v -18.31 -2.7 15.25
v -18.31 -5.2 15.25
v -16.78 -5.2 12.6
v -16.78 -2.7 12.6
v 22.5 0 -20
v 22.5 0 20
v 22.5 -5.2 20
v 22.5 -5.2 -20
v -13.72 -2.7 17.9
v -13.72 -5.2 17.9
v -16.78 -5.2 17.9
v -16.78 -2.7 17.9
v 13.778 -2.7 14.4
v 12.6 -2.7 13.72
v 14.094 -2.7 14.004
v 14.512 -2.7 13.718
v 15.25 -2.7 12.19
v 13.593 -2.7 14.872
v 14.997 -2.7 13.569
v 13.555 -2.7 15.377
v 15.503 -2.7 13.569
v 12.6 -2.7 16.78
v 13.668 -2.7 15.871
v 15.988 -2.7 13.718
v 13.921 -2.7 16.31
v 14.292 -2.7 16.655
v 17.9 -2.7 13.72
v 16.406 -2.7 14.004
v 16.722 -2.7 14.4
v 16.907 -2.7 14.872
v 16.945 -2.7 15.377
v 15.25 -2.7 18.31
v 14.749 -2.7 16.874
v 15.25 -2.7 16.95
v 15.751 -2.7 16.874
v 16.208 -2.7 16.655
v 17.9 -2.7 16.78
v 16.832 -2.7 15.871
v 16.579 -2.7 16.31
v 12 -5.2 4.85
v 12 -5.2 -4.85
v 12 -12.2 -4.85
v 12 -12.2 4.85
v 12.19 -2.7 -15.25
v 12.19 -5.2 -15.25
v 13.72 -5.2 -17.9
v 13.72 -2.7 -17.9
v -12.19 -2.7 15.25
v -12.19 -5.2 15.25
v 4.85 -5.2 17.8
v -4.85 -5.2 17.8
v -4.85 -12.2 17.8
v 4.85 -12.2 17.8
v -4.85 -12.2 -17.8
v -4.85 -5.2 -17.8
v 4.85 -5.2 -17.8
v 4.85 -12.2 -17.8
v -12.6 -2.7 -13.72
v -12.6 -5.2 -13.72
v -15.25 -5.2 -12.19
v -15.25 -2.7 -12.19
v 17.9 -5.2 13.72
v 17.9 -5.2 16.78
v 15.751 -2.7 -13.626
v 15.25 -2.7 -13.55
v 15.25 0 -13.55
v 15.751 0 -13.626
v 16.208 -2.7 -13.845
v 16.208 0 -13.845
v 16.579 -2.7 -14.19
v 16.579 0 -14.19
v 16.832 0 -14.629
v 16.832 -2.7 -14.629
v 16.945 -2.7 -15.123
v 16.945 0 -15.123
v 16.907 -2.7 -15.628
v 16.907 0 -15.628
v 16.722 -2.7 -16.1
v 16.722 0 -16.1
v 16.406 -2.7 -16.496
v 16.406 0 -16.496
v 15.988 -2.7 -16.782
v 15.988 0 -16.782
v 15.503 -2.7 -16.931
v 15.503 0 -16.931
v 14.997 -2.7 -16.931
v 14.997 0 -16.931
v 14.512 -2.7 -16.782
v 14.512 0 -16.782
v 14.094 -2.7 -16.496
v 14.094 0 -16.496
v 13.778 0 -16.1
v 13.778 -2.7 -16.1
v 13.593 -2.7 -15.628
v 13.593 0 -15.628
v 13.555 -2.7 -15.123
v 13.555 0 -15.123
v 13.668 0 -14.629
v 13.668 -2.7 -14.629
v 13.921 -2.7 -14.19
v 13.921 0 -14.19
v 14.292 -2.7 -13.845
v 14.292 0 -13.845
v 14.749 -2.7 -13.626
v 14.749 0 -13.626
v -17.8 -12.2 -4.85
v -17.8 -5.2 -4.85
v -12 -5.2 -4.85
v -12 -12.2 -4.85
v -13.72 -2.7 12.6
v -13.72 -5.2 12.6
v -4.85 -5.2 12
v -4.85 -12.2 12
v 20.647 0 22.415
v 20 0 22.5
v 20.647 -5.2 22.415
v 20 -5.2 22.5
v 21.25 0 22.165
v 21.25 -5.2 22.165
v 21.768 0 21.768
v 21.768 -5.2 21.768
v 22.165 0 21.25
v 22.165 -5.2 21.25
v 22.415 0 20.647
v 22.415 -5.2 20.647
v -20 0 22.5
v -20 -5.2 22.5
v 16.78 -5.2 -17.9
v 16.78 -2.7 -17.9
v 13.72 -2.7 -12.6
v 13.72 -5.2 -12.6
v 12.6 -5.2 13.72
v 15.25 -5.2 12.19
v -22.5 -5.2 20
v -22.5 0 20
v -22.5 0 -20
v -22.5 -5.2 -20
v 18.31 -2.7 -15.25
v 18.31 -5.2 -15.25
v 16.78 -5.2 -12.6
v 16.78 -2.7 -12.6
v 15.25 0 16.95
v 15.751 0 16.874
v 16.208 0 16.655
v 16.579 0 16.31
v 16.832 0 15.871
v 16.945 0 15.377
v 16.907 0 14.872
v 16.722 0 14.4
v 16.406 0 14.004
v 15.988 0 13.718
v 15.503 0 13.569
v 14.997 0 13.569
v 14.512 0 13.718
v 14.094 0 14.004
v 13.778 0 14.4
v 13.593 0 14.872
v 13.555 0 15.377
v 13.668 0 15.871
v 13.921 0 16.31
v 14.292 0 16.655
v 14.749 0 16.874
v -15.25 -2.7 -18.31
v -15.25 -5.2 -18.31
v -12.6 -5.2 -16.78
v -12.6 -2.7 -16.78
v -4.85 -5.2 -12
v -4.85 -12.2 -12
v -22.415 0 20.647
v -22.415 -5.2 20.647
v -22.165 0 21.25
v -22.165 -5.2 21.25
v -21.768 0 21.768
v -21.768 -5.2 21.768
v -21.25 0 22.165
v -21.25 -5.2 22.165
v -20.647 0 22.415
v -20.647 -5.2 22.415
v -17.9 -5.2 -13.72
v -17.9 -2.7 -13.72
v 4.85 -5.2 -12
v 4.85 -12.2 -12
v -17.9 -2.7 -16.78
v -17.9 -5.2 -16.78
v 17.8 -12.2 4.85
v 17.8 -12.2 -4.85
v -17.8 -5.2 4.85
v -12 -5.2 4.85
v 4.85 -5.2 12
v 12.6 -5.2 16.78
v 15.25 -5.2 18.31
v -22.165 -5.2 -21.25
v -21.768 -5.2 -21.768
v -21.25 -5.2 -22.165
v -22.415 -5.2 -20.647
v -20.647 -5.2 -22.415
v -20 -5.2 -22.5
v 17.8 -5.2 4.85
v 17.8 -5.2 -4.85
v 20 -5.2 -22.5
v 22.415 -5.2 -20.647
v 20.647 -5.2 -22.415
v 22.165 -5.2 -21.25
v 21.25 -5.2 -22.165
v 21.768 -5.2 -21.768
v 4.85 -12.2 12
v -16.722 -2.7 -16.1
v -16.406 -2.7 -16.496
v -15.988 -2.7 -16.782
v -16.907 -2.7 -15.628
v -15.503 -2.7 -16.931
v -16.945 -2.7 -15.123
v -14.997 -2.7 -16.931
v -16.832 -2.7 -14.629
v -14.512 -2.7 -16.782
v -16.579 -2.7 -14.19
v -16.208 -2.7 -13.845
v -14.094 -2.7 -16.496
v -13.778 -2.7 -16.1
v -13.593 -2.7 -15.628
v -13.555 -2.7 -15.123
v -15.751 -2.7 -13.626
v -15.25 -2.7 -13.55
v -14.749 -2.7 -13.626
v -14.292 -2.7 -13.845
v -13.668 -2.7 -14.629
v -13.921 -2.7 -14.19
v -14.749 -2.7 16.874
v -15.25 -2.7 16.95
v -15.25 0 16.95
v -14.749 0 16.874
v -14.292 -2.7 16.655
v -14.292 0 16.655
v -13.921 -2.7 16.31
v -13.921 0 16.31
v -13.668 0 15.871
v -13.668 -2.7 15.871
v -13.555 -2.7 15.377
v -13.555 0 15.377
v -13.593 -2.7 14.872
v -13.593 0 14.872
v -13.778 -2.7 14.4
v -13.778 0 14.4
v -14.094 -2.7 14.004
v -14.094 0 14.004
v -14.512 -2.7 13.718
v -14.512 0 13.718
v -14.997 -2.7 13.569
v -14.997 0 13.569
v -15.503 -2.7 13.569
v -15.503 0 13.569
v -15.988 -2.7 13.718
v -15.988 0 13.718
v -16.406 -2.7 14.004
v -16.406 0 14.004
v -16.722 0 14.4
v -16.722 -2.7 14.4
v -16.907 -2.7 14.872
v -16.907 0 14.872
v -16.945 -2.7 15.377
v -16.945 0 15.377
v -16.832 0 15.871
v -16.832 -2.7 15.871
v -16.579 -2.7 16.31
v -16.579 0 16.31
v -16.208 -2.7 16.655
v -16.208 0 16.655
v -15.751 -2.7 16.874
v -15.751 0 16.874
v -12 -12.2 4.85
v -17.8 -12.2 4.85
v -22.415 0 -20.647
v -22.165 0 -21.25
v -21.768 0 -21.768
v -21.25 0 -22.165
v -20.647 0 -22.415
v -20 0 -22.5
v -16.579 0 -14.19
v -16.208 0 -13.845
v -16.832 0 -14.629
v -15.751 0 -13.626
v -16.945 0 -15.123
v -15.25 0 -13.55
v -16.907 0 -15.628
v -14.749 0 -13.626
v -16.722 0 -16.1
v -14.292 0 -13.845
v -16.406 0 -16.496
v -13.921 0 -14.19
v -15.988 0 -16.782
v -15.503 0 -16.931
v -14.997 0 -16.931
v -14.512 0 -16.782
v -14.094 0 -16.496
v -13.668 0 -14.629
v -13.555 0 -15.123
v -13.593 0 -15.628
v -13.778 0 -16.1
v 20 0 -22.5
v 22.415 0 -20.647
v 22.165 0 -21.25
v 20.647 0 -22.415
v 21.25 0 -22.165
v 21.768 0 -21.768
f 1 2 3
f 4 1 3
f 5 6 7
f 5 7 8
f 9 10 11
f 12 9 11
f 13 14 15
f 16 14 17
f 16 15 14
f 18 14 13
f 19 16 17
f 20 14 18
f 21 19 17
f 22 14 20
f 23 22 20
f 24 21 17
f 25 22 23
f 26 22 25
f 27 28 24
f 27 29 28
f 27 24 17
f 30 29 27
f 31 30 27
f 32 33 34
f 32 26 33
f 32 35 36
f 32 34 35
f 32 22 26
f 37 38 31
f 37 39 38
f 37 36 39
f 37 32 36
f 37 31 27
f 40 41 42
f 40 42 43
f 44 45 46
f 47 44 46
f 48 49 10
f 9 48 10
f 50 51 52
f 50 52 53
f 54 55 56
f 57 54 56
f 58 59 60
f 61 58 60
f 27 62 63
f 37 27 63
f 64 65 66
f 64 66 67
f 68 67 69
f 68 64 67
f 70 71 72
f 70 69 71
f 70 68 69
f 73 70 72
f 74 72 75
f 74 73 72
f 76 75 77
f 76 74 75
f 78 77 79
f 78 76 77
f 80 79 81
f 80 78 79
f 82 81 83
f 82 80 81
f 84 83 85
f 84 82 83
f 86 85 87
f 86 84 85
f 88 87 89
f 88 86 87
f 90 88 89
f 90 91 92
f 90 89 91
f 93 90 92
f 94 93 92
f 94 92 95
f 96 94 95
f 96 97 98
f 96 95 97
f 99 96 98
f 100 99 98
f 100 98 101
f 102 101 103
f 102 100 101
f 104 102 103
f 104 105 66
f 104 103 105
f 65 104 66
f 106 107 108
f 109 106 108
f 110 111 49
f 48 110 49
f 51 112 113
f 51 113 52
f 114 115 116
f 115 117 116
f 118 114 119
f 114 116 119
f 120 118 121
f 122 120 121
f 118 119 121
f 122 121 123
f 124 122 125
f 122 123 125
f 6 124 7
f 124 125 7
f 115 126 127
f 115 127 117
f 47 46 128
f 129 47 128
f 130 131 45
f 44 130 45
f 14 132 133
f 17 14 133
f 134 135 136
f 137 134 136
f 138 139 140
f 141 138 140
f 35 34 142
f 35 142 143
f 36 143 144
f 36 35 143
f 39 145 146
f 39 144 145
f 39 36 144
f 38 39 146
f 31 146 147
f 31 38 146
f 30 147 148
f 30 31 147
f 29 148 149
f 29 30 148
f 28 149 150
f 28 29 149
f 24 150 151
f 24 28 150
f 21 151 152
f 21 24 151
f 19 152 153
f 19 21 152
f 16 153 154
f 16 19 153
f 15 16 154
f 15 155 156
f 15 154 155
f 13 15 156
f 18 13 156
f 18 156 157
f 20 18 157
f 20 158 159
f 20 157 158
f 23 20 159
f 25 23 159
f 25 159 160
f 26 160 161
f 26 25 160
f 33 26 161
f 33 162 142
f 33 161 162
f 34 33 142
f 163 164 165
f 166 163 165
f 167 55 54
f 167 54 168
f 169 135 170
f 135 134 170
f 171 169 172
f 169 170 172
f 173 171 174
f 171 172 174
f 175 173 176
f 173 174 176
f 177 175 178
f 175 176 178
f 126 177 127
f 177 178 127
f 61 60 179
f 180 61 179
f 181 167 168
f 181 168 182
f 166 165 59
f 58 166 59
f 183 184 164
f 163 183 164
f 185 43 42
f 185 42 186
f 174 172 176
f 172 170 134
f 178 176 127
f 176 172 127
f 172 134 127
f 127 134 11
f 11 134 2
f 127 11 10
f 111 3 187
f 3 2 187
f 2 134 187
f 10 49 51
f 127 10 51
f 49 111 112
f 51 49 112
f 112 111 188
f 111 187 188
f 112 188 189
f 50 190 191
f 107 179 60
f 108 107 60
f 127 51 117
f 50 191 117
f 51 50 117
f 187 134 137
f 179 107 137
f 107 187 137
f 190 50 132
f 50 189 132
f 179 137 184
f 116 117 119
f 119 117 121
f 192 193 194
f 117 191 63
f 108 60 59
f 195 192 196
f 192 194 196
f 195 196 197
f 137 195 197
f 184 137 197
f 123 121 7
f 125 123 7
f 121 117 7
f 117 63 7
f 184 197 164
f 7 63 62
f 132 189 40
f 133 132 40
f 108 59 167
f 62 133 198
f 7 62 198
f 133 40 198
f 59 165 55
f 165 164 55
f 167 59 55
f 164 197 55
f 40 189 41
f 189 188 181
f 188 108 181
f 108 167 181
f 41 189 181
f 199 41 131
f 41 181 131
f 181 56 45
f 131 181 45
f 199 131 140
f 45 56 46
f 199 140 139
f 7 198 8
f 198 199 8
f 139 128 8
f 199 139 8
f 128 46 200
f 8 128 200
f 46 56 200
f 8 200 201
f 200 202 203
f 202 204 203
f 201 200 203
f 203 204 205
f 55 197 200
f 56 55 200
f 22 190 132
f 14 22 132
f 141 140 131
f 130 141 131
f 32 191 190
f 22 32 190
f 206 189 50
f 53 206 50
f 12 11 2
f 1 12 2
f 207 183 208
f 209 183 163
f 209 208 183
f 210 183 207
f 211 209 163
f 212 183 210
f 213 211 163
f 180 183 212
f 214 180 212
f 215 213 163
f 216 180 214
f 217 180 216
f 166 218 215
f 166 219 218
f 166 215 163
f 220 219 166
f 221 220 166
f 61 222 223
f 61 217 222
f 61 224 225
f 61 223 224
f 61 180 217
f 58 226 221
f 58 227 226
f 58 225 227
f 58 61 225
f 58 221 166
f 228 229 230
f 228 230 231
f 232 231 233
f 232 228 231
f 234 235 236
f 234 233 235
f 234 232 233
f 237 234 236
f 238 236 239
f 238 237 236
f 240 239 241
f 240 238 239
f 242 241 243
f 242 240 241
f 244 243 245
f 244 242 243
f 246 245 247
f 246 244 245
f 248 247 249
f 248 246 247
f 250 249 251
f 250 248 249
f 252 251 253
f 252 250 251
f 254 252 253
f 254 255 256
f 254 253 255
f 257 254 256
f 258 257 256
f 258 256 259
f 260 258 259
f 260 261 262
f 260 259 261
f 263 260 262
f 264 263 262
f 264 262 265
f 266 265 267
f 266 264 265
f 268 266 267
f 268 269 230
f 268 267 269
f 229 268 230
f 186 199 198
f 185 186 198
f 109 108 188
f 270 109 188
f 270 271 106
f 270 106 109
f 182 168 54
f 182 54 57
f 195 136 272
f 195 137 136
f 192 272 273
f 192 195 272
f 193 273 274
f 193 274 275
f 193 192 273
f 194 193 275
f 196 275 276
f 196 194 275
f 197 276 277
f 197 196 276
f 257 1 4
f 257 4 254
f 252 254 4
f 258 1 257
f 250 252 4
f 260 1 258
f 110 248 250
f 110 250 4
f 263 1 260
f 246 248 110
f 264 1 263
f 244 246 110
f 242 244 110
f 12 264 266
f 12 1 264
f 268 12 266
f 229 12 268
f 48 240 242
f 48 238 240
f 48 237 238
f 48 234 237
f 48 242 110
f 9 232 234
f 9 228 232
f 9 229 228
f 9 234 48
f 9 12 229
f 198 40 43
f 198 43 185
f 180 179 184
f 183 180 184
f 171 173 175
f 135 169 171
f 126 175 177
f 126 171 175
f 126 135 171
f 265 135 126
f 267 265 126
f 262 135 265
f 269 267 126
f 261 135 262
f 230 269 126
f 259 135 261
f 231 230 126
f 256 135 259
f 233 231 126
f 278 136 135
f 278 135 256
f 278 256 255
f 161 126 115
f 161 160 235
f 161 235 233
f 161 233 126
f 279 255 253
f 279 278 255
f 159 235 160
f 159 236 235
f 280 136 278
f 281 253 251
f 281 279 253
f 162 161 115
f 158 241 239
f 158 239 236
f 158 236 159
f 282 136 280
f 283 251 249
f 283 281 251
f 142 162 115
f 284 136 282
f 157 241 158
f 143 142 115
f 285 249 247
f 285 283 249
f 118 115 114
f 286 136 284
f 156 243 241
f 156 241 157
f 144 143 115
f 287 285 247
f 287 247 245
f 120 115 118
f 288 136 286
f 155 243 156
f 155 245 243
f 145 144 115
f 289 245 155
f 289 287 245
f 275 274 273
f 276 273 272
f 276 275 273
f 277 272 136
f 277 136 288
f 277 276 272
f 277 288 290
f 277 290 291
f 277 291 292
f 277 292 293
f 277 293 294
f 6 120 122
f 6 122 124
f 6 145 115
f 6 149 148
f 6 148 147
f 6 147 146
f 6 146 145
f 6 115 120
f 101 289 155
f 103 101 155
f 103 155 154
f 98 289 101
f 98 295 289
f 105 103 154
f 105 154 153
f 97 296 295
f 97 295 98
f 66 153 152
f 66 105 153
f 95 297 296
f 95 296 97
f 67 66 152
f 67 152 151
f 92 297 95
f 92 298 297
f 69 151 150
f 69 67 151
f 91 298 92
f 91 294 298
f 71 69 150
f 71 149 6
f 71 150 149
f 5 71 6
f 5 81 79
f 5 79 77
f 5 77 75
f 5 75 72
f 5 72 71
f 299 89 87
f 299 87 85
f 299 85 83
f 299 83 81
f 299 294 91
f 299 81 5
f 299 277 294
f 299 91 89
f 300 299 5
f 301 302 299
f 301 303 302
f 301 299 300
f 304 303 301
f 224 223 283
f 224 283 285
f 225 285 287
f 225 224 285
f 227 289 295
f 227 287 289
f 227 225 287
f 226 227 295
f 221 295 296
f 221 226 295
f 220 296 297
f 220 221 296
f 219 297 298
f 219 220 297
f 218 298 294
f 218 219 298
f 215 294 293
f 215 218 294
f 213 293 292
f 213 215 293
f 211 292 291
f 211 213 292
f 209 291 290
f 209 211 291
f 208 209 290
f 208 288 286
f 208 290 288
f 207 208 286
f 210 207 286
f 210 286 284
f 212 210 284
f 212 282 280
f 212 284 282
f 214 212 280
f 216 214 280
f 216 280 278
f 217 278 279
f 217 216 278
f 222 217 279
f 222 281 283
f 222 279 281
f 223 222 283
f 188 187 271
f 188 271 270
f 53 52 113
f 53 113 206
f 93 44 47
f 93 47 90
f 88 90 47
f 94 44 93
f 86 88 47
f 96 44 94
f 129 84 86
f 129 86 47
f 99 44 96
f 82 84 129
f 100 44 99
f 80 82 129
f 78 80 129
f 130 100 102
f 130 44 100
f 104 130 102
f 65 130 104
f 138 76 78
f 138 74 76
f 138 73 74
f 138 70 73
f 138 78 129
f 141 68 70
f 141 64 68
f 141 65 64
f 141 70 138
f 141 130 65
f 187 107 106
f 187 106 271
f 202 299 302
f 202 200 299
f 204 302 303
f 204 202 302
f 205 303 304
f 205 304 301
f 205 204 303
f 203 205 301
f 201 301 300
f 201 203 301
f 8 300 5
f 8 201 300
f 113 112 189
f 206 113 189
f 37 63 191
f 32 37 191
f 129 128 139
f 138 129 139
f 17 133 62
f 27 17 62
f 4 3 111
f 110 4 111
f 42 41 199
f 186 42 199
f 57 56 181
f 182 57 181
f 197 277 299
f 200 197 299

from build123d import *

# Parameters (mm, degrees)
SKETCH1_W               = 45
SKETCH1_H               = 45
BOSS_EXTRUDE1_DEPTH     = 5.2
SKETCH2_W               = 9.7
SKETCH2_H               = 5.8
SKETCH2_W_2             = 5.8
SKETCH2_H_2             = 9.7
BOSS_EXTRUDE2_DEPTH     = 7
CUT_EXTRUDE1_DEPTH      = 35.078438931
CUT_EXTRUDE1_DEPTH_BACK = 35.078438931
SKETCH3_R               = 1.7
CUT_EXTRUDE2_DEPTH      = 2.5
FILLET1_R               = 2.5


with BuildPart() as part:
    # Sketch1 → Boss-Extrude1 (new body)
    with BuildSketch(Plane(origin=(0, 0, 0), x_dir=(1, 0, 0), z_dir=(0, 1, 0))):
        Rectangle(SKETCH1_W, SKETCH1_H)
    extrude(amount=-BOSS_EXTRUDE1_DEPTH)

    # Sketch2 → Boss-Extrude2 (add)
    with BuildSketch(Plane.XZ.offset(5.2)):
        with Locations((0, 14.9)):
            Rectangle(SKETCH2_W, SKETCH2_H)
        with Locations((-14.9, 0)):
            Rectangle(SKETCH2_W_2, SKETCH2_H_2)
        with Locations((14.9, 0)):
            Rectangle(SKETCH2_W_2, SKETCH2_H_2)
        with Locations((0, -14.9)):
            Rectangle(SKETCH2_W, SKETCH2_H)
    extrude(amount=BOSS_EXTRUDE2_DEPTH)

    # Sketch3 → Cut-Extrude1 (cut, two sides: drawn at the far end of the back side and taken through both)
    with BuildSketch(Plane(origin=(0, 0, 0), x_dir=(1, 0, 0), z_dir=(0, 1, 0)).offset(-CUT_EXTRUDE1_DEPTH_BACK)):
        with Locations(Location((-15.25, 15.25, 0), (0, 0, 270))):
            Circle(SKETCH3_R)
        with Locations(Location((15.25, 15.25, 0), (0, 0, 270))):
            Circle(SKETCH3_R)
        with Locations(Location((-15.25, -15.25, 0), (0, 0, 270))):
            Circle(SKETCH3_R)
        with Locations(Location((15.25, -15.25, 0), (0, 0, 270))):
            Circle(SKETCH3_R)
    extrude(amount=CUT_EXTRUDE1_DEPTH + CUT_EXTRUDE1_DEPTH_BACK, mode=Mode.SUBTRACT)

    # Sketch4 → Cut-Extrude2 (cut)
    with BuildSketch(Plane.XZ.offset(5.2)):
        Polygon((12.6, 13.720021787), (15.25, 12.190043573), (17.9, 13.720021787), (17.9, 16.779978213), (15.25, 18.309956427), (12.6, 16.779978213), align=None)
        Polygon((-13.720021787, 12.6), (-12.190043573, 15.25), (-13.720021787, 17.9), (-16.779978213, 17.9), (-18.309956427, 15.25), (-16.779978213, 12.6), align=None)
        Polygon((13.720021787, -12.6), (12.190043573, -15.25), (13.720021787, -17.9), (16.779978213, -17.9), (18.309956427, -15.25), (16.779978213, -12.6), align=None)
        Polygon((-12.6, -13.720021787), (-15.25, -12.190043573), (-17.9, -13.720021787), (-17.9, -16.779978213), (-15.25, -18.309956427), (-12.6, -16.779978213), align=None)
    extrude(amount=-CUT_EXTRUDE2_DEPTH, mode=Mode.SUBTRACT)

    # Fillet1
    fillet1_edges = [part.edges().sort_by_distance(p)[0] for p in [
        (22.5, -2.6, 22.5),
        (-22.5, -2.6, 22.5),
        (-22.5, -2.6, -22.5),
        (22.5, -2.6, -22.5),
    ]]
    fillet(fillet1_edges, radius=FILLET1_R)


solid = part.part
